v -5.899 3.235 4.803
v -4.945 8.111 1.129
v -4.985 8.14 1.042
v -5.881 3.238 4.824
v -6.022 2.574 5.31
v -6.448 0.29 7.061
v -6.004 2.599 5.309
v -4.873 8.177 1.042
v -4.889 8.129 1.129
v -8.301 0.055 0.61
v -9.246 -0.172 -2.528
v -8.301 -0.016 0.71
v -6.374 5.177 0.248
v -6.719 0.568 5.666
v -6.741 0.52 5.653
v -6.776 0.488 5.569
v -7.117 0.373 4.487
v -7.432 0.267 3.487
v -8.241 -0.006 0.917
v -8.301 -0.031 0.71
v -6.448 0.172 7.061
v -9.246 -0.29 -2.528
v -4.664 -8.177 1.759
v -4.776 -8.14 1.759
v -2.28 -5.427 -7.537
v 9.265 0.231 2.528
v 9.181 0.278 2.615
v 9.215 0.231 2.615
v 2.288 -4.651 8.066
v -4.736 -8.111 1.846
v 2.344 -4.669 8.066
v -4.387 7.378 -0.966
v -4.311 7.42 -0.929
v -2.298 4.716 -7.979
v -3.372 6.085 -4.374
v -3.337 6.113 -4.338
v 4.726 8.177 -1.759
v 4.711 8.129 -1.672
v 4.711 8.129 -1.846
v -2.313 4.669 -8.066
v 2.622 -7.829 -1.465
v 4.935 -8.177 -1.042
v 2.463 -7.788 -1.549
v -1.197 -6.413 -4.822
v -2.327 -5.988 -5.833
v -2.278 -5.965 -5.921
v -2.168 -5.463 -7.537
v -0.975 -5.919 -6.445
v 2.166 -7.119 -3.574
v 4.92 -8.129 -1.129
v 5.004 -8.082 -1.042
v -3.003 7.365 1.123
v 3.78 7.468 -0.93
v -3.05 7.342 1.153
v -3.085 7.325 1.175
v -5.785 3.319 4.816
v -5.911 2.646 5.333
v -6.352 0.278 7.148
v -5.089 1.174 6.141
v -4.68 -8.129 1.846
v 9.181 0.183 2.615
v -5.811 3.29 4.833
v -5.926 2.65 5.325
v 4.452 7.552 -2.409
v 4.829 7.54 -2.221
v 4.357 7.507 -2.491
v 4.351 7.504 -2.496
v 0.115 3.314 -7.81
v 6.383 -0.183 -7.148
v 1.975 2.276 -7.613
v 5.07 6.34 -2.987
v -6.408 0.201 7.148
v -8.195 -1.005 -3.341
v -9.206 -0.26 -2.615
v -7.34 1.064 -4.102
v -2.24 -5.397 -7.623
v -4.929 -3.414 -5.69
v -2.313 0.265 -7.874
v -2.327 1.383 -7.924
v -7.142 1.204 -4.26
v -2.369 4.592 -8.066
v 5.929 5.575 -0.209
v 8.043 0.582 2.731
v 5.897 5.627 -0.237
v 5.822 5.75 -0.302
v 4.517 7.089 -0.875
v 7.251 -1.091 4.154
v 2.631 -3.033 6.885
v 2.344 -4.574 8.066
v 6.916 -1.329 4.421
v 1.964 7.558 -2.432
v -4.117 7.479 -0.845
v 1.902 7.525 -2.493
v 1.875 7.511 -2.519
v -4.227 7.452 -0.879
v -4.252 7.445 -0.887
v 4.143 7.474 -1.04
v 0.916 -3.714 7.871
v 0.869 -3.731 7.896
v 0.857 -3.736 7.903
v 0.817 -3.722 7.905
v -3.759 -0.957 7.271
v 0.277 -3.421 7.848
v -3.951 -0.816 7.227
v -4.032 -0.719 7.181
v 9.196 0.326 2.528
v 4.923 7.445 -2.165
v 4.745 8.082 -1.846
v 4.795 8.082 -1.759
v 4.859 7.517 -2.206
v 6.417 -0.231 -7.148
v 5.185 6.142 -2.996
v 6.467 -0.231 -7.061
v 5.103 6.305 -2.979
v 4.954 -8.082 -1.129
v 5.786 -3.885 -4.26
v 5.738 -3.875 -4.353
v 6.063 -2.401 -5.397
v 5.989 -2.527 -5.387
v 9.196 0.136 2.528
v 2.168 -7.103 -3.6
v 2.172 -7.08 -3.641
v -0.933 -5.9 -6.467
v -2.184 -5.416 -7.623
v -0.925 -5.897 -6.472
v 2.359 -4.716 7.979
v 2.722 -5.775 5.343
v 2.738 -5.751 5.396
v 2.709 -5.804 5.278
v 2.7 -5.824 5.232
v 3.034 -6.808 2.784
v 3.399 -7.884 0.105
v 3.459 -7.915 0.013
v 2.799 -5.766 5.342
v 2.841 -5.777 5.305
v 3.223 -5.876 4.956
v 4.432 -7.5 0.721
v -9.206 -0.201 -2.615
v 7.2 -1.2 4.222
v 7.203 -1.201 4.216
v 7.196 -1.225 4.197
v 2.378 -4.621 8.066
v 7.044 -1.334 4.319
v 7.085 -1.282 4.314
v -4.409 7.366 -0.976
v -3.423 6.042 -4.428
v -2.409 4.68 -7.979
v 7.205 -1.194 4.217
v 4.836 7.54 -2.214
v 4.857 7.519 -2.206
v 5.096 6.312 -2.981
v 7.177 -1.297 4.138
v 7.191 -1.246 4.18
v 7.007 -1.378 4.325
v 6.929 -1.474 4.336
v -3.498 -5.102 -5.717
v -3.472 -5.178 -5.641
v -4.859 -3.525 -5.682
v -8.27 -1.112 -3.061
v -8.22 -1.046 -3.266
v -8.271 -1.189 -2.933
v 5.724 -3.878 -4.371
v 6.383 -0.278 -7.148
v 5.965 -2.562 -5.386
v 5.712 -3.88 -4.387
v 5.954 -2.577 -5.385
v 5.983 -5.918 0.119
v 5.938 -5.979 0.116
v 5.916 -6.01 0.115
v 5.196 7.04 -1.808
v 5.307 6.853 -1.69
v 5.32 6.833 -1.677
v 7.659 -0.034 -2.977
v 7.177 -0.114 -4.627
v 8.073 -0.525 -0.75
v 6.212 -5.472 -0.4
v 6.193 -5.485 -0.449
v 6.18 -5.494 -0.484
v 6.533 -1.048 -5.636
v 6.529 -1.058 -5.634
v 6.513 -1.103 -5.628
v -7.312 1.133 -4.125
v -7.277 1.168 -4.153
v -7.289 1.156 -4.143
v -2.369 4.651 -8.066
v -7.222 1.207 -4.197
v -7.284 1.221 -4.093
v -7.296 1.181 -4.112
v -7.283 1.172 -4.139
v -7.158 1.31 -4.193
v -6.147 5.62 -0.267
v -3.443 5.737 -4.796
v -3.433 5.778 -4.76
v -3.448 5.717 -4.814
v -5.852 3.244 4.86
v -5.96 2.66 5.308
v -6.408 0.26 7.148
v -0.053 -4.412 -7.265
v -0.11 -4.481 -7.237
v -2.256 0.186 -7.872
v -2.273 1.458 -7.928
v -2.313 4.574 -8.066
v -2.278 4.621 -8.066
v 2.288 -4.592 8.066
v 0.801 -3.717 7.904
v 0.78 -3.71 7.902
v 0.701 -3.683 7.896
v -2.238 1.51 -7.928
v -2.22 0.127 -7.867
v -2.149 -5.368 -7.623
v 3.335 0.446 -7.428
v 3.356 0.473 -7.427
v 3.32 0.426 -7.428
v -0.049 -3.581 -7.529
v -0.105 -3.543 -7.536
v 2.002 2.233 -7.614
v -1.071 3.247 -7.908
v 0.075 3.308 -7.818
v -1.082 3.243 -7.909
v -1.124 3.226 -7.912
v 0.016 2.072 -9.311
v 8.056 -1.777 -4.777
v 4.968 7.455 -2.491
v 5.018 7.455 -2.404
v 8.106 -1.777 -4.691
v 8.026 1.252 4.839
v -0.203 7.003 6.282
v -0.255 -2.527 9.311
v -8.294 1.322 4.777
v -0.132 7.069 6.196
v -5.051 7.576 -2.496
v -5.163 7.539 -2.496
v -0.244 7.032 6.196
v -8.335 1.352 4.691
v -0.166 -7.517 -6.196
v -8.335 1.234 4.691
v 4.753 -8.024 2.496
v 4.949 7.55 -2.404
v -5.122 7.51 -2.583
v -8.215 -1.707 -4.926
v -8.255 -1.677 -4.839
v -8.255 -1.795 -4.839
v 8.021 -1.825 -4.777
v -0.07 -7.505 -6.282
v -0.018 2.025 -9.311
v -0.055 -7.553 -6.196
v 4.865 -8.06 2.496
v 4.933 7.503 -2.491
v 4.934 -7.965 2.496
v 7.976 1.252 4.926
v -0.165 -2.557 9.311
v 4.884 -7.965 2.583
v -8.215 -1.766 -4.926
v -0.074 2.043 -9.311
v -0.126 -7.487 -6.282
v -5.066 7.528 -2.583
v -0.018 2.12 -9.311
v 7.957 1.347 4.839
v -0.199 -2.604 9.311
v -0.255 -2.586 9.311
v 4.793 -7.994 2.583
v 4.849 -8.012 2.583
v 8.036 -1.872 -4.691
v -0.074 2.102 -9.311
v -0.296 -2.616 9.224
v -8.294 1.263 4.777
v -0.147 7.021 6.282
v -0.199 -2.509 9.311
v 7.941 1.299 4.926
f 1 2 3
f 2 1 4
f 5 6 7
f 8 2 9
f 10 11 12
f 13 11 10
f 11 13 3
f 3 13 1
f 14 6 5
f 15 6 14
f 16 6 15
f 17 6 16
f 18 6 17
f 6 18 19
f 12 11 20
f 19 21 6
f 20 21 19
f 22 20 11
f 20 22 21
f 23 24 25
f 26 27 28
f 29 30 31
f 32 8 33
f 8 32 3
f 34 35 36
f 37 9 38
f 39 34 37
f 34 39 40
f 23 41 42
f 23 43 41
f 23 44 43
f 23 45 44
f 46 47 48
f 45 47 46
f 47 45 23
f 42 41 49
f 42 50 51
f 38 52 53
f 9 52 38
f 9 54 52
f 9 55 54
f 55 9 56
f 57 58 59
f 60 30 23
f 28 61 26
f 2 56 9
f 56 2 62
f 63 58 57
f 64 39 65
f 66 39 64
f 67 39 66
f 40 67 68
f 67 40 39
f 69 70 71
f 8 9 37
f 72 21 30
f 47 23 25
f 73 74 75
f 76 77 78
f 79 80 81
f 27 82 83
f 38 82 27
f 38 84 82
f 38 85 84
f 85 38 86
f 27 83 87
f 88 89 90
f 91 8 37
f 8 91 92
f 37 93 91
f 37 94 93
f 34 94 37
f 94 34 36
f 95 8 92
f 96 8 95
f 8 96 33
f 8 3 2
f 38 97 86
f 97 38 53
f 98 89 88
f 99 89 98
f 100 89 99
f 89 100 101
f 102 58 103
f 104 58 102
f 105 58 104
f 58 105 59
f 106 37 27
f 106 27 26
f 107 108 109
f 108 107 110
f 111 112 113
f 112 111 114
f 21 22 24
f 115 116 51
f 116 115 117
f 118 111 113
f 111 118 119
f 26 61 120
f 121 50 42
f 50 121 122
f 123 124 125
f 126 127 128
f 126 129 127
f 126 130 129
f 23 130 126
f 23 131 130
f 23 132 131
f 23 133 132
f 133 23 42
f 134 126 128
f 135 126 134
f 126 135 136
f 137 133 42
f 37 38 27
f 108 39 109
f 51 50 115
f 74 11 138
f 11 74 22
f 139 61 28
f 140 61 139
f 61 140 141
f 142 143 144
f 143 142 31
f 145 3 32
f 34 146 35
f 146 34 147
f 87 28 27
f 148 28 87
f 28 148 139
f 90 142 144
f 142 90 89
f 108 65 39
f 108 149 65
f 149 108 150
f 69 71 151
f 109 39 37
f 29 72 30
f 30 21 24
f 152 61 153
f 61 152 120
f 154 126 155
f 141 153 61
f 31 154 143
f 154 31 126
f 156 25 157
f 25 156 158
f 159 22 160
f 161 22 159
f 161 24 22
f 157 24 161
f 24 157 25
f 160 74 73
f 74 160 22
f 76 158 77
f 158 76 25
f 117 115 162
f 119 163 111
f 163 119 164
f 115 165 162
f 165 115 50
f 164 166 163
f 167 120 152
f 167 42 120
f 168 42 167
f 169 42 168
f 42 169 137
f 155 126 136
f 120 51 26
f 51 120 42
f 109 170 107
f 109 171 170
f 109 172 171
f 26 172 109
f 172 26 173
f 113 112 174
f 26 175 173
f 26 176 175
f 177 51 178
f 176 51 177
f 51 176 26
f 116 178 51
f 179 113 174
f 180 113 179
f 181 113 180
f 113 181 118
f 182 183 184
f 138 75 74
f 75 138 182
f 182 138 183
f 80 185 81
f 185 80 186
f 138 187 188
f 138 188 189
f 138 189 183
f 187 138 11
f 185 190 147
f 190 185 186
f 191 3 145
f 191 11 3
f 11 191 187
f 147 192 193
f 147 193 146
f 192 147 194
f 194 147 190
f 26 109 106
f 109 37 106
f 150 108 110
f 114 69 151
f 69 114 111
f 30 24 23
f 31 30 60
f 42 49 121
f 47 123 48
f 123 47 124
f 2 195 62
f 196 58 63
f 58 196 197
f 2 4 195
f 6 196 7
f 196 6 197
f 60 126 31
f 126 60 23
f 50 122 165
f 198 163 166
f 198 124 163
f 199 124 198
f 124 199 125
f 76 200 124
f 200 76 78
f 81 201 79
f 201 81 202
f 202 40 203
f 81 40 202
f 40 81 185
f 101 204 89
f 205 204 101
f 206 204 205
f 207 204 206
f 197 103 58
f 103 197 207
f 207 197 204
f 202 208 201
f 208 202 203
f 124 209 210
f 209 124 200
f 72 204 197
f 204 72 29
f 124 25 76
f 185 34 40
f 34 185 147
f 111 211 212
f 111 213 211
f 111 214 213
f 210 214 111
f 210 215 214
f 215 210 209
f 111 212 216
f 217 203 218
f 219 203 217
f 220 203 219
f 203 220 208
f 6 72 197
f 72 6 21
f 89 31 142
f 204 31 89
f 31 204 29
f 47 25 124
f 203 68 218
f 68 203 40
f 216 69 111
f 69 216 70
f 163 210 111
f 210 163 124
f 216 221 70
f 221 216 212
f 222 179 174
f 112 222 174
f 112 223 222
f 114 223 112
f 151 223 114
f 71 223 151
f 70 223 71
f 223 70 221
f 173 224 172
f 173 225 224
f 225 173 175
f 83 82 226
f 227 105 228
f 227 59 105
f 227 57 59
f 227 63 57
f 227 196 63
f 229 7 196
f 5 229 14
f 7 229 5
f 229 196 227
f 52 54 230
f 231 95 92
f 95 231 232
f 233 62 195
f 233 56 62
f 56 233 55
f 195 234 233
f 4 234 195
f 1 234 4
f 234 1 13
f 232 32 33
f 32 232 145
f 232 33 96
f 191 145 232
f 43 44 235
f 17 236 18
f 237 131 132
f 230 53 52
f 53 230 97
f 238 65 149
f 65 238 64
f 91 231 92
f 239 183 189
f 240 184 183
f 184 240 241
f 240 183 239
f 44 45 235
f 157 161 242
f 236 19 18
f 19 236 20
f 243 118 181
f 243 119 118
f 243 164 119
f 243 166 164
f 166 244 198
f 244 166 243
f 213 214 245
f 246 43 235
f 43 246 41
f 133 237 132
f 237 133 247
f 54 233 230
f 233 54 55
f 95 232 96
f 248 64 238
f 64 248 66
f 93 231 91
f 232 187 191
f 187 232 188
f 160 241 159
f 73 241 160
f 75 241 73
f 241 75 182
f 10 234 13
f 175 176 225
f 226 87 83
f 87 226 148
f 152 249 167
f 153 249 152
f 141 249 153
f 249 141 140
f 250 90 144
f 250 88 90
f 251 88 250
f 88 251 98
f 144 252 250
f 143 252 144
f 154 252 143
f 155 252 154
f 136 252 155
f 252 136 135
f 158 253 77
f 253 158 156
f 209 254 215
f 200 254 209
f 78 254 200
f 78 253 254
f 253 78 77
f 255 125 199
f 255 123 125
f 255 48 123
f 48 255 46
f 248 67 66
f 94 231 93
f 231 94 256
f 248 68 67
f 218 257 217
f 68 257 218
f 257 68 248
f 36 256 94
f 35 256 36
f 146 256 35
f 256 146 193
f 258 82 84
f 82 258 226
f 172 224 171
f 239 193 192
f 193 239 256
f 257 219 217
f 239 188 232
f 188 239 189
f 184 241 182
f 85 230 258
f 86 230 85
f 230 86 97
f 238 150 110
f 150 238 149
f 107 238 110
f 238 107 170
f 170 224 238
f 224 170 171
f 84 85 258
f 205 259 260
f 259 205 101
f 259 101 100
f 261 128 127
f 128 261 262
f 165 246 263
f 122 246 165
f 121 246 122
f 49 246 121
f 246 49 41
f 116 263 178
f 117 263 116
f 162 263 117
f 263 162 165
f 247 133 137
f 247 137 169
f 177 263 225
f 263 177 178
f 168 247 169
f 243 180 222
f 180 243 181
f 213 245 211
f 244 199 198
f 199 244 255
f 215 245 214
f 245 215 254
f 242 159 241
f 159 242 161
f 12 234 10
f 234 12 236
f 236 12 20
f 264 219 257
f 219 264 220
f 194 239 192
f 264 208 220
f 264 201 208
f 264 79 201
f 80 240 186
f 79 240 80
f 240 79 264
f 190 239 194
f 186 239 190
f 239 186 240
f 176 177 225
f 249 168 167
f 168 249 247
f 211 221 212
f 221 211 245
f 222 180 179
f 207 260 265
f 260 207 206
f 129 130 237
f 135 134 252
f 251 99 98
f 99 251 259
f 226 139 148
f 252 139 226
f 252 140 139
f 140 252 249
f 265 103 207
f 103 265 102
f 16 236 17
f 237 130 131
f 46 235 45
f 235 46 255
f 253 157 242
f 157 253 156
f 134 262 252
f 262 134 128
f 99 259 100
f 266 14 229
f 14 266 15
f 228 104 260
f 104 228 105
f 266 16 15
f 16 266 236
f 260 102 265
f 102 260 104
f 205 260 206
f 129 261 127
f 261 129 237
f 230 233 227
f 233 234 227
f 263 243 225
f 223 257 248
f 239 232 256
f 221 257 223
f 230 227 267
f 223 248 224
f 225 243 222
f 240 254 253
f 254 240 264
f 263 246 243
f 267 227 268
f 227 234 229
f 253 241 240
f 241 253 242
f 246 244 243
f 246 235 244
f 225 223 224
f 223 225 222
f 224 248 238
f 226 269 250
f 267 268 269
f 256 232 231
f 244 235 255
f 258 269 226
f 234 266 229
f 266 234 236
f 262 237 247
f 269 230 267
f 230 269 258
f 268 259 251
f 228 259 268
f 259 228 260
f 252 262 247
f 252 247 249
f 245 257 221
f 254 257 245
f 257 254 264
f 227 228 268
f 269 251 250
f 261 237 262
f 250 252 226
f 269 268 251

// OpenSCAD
// Auto-generated OpenSCAD file

    inner_points = 10*[[0.48336147006620667, -0.796491443485512, 0.24961052401954548], [-0.0033636129242731877, 0.20724337779290775, -0.9224172448029275], [-0.02146243534842994, -0.25567359892911584, 0.9224172448029275], [-0.5081875183389098, 0.7480612223493041, -0.24961052401954548], [0.8005548202773529, -0.17771619883438955, -0.46907269909671206], [-0.008558631255711907, -0.7457756765165251, -0.6195514429901602], [-0.01626741701699122, 0.6973454553803171, 0.6195514429901602], [-0.8253808685500561, 0.12928597769818145, 0.46907269909671206], [0.7925798307638832, 0.1251835430715676, 0.4839163595474912], [0.49176718629865324, 0.7455257783134321, -0.24043663734350143], [-0.8174058790365863, -0.1736137642077757, -0.4839163595474912]];

    outer_points = 10*[[0.46952448230116467, 0.8081551775499222, -0.1758990241773695], [0.49043976285885654, -0.8081551775499222, -0.10422353473988513], [-0.49043976285885654, 0.8081551775499222, 0.10422353473988513], [-0.46952448230116467, -0.8081551775499222, 0.1758990241773695], [0.6367153111321443, -0.02307267632934869, -0.7060947254896978], [0.9165394655214069, 0.02307267632934869, 0.2528469041459849], [-0.9165394655214069, -0.02307267632934869, -0.2528469041459849], [-0.6367153111321443, 0.02307267632934869, 0.7060947254896978], [-0.23284567347195917, 0.4621349933977465, -0.7979490193051987], [-0.2199193192030657, -0.5367997424223692, -0.7536511306725492], [0.23284567347195917, -0.4621349933977465, 0.7979490193051987]];

    // Convex hull for inner set (I)
    module inner_hull() {
        hull() {
            for (p = inner_points) {
                translate(p) sphere(r=0.1);
            }
        }
    }

    // Convex hull for outer set (O) minus inner hull (O \ I)
    module outer_minus_inner() {
        difference() {
            hull() {
                for (p = outer_points) {
                    translate(p) sphere(r=0.1);
                }
            }
            inner_hull(); // Subtract inner hull
        }
    }

    // Convex hull for outer set (O) minus all translated inner hulls
    module outer_minus_AllTranslationInner() {
        difference() {
            hull() {
                for (p = outer_points) {
                    translate(p) sphere(r=0.1);
                }
            }
            hull() {
                translate([0,0,50]) inner_hull();
                translate([0,0,-50]) inner_hull();
            }; // Subtract translated inner hulls
        }
    }

    // Difference between outer_minus_inner and outer_minus_AllTranslationInner
    module outer_minus_inner_diff() {
        difference() {
            // Outer minus inner
            difference() {
                hull() {
                    for (p = outer_points) {
                        translate(p) sphere(r=0.1);
                    }
                }
                inner_hull();
            }

            // Subtract Outer minus AllTranslationInner
            difference() {
                hull() {
                    for (p = outer_points) {
                        translate(p) sphere(r=0.1);
                    }
                }
                hull() {
                    translate([0,0,50]) inner_hull();
                    translate([0,0,-50]) inner_hull();
                };
            }
        }
    }

    // Rendering all with colors applied
    color([1, 0, 0, 0.5]) inner_hull(); // Transparent red
    color([0, 1, 0, 1]) outer_minus_AllTranslationInner(); // Opaque green
    color([1, 1, 0, 1]) outer_minus_inner_diff(); // Opaque yellow
    
